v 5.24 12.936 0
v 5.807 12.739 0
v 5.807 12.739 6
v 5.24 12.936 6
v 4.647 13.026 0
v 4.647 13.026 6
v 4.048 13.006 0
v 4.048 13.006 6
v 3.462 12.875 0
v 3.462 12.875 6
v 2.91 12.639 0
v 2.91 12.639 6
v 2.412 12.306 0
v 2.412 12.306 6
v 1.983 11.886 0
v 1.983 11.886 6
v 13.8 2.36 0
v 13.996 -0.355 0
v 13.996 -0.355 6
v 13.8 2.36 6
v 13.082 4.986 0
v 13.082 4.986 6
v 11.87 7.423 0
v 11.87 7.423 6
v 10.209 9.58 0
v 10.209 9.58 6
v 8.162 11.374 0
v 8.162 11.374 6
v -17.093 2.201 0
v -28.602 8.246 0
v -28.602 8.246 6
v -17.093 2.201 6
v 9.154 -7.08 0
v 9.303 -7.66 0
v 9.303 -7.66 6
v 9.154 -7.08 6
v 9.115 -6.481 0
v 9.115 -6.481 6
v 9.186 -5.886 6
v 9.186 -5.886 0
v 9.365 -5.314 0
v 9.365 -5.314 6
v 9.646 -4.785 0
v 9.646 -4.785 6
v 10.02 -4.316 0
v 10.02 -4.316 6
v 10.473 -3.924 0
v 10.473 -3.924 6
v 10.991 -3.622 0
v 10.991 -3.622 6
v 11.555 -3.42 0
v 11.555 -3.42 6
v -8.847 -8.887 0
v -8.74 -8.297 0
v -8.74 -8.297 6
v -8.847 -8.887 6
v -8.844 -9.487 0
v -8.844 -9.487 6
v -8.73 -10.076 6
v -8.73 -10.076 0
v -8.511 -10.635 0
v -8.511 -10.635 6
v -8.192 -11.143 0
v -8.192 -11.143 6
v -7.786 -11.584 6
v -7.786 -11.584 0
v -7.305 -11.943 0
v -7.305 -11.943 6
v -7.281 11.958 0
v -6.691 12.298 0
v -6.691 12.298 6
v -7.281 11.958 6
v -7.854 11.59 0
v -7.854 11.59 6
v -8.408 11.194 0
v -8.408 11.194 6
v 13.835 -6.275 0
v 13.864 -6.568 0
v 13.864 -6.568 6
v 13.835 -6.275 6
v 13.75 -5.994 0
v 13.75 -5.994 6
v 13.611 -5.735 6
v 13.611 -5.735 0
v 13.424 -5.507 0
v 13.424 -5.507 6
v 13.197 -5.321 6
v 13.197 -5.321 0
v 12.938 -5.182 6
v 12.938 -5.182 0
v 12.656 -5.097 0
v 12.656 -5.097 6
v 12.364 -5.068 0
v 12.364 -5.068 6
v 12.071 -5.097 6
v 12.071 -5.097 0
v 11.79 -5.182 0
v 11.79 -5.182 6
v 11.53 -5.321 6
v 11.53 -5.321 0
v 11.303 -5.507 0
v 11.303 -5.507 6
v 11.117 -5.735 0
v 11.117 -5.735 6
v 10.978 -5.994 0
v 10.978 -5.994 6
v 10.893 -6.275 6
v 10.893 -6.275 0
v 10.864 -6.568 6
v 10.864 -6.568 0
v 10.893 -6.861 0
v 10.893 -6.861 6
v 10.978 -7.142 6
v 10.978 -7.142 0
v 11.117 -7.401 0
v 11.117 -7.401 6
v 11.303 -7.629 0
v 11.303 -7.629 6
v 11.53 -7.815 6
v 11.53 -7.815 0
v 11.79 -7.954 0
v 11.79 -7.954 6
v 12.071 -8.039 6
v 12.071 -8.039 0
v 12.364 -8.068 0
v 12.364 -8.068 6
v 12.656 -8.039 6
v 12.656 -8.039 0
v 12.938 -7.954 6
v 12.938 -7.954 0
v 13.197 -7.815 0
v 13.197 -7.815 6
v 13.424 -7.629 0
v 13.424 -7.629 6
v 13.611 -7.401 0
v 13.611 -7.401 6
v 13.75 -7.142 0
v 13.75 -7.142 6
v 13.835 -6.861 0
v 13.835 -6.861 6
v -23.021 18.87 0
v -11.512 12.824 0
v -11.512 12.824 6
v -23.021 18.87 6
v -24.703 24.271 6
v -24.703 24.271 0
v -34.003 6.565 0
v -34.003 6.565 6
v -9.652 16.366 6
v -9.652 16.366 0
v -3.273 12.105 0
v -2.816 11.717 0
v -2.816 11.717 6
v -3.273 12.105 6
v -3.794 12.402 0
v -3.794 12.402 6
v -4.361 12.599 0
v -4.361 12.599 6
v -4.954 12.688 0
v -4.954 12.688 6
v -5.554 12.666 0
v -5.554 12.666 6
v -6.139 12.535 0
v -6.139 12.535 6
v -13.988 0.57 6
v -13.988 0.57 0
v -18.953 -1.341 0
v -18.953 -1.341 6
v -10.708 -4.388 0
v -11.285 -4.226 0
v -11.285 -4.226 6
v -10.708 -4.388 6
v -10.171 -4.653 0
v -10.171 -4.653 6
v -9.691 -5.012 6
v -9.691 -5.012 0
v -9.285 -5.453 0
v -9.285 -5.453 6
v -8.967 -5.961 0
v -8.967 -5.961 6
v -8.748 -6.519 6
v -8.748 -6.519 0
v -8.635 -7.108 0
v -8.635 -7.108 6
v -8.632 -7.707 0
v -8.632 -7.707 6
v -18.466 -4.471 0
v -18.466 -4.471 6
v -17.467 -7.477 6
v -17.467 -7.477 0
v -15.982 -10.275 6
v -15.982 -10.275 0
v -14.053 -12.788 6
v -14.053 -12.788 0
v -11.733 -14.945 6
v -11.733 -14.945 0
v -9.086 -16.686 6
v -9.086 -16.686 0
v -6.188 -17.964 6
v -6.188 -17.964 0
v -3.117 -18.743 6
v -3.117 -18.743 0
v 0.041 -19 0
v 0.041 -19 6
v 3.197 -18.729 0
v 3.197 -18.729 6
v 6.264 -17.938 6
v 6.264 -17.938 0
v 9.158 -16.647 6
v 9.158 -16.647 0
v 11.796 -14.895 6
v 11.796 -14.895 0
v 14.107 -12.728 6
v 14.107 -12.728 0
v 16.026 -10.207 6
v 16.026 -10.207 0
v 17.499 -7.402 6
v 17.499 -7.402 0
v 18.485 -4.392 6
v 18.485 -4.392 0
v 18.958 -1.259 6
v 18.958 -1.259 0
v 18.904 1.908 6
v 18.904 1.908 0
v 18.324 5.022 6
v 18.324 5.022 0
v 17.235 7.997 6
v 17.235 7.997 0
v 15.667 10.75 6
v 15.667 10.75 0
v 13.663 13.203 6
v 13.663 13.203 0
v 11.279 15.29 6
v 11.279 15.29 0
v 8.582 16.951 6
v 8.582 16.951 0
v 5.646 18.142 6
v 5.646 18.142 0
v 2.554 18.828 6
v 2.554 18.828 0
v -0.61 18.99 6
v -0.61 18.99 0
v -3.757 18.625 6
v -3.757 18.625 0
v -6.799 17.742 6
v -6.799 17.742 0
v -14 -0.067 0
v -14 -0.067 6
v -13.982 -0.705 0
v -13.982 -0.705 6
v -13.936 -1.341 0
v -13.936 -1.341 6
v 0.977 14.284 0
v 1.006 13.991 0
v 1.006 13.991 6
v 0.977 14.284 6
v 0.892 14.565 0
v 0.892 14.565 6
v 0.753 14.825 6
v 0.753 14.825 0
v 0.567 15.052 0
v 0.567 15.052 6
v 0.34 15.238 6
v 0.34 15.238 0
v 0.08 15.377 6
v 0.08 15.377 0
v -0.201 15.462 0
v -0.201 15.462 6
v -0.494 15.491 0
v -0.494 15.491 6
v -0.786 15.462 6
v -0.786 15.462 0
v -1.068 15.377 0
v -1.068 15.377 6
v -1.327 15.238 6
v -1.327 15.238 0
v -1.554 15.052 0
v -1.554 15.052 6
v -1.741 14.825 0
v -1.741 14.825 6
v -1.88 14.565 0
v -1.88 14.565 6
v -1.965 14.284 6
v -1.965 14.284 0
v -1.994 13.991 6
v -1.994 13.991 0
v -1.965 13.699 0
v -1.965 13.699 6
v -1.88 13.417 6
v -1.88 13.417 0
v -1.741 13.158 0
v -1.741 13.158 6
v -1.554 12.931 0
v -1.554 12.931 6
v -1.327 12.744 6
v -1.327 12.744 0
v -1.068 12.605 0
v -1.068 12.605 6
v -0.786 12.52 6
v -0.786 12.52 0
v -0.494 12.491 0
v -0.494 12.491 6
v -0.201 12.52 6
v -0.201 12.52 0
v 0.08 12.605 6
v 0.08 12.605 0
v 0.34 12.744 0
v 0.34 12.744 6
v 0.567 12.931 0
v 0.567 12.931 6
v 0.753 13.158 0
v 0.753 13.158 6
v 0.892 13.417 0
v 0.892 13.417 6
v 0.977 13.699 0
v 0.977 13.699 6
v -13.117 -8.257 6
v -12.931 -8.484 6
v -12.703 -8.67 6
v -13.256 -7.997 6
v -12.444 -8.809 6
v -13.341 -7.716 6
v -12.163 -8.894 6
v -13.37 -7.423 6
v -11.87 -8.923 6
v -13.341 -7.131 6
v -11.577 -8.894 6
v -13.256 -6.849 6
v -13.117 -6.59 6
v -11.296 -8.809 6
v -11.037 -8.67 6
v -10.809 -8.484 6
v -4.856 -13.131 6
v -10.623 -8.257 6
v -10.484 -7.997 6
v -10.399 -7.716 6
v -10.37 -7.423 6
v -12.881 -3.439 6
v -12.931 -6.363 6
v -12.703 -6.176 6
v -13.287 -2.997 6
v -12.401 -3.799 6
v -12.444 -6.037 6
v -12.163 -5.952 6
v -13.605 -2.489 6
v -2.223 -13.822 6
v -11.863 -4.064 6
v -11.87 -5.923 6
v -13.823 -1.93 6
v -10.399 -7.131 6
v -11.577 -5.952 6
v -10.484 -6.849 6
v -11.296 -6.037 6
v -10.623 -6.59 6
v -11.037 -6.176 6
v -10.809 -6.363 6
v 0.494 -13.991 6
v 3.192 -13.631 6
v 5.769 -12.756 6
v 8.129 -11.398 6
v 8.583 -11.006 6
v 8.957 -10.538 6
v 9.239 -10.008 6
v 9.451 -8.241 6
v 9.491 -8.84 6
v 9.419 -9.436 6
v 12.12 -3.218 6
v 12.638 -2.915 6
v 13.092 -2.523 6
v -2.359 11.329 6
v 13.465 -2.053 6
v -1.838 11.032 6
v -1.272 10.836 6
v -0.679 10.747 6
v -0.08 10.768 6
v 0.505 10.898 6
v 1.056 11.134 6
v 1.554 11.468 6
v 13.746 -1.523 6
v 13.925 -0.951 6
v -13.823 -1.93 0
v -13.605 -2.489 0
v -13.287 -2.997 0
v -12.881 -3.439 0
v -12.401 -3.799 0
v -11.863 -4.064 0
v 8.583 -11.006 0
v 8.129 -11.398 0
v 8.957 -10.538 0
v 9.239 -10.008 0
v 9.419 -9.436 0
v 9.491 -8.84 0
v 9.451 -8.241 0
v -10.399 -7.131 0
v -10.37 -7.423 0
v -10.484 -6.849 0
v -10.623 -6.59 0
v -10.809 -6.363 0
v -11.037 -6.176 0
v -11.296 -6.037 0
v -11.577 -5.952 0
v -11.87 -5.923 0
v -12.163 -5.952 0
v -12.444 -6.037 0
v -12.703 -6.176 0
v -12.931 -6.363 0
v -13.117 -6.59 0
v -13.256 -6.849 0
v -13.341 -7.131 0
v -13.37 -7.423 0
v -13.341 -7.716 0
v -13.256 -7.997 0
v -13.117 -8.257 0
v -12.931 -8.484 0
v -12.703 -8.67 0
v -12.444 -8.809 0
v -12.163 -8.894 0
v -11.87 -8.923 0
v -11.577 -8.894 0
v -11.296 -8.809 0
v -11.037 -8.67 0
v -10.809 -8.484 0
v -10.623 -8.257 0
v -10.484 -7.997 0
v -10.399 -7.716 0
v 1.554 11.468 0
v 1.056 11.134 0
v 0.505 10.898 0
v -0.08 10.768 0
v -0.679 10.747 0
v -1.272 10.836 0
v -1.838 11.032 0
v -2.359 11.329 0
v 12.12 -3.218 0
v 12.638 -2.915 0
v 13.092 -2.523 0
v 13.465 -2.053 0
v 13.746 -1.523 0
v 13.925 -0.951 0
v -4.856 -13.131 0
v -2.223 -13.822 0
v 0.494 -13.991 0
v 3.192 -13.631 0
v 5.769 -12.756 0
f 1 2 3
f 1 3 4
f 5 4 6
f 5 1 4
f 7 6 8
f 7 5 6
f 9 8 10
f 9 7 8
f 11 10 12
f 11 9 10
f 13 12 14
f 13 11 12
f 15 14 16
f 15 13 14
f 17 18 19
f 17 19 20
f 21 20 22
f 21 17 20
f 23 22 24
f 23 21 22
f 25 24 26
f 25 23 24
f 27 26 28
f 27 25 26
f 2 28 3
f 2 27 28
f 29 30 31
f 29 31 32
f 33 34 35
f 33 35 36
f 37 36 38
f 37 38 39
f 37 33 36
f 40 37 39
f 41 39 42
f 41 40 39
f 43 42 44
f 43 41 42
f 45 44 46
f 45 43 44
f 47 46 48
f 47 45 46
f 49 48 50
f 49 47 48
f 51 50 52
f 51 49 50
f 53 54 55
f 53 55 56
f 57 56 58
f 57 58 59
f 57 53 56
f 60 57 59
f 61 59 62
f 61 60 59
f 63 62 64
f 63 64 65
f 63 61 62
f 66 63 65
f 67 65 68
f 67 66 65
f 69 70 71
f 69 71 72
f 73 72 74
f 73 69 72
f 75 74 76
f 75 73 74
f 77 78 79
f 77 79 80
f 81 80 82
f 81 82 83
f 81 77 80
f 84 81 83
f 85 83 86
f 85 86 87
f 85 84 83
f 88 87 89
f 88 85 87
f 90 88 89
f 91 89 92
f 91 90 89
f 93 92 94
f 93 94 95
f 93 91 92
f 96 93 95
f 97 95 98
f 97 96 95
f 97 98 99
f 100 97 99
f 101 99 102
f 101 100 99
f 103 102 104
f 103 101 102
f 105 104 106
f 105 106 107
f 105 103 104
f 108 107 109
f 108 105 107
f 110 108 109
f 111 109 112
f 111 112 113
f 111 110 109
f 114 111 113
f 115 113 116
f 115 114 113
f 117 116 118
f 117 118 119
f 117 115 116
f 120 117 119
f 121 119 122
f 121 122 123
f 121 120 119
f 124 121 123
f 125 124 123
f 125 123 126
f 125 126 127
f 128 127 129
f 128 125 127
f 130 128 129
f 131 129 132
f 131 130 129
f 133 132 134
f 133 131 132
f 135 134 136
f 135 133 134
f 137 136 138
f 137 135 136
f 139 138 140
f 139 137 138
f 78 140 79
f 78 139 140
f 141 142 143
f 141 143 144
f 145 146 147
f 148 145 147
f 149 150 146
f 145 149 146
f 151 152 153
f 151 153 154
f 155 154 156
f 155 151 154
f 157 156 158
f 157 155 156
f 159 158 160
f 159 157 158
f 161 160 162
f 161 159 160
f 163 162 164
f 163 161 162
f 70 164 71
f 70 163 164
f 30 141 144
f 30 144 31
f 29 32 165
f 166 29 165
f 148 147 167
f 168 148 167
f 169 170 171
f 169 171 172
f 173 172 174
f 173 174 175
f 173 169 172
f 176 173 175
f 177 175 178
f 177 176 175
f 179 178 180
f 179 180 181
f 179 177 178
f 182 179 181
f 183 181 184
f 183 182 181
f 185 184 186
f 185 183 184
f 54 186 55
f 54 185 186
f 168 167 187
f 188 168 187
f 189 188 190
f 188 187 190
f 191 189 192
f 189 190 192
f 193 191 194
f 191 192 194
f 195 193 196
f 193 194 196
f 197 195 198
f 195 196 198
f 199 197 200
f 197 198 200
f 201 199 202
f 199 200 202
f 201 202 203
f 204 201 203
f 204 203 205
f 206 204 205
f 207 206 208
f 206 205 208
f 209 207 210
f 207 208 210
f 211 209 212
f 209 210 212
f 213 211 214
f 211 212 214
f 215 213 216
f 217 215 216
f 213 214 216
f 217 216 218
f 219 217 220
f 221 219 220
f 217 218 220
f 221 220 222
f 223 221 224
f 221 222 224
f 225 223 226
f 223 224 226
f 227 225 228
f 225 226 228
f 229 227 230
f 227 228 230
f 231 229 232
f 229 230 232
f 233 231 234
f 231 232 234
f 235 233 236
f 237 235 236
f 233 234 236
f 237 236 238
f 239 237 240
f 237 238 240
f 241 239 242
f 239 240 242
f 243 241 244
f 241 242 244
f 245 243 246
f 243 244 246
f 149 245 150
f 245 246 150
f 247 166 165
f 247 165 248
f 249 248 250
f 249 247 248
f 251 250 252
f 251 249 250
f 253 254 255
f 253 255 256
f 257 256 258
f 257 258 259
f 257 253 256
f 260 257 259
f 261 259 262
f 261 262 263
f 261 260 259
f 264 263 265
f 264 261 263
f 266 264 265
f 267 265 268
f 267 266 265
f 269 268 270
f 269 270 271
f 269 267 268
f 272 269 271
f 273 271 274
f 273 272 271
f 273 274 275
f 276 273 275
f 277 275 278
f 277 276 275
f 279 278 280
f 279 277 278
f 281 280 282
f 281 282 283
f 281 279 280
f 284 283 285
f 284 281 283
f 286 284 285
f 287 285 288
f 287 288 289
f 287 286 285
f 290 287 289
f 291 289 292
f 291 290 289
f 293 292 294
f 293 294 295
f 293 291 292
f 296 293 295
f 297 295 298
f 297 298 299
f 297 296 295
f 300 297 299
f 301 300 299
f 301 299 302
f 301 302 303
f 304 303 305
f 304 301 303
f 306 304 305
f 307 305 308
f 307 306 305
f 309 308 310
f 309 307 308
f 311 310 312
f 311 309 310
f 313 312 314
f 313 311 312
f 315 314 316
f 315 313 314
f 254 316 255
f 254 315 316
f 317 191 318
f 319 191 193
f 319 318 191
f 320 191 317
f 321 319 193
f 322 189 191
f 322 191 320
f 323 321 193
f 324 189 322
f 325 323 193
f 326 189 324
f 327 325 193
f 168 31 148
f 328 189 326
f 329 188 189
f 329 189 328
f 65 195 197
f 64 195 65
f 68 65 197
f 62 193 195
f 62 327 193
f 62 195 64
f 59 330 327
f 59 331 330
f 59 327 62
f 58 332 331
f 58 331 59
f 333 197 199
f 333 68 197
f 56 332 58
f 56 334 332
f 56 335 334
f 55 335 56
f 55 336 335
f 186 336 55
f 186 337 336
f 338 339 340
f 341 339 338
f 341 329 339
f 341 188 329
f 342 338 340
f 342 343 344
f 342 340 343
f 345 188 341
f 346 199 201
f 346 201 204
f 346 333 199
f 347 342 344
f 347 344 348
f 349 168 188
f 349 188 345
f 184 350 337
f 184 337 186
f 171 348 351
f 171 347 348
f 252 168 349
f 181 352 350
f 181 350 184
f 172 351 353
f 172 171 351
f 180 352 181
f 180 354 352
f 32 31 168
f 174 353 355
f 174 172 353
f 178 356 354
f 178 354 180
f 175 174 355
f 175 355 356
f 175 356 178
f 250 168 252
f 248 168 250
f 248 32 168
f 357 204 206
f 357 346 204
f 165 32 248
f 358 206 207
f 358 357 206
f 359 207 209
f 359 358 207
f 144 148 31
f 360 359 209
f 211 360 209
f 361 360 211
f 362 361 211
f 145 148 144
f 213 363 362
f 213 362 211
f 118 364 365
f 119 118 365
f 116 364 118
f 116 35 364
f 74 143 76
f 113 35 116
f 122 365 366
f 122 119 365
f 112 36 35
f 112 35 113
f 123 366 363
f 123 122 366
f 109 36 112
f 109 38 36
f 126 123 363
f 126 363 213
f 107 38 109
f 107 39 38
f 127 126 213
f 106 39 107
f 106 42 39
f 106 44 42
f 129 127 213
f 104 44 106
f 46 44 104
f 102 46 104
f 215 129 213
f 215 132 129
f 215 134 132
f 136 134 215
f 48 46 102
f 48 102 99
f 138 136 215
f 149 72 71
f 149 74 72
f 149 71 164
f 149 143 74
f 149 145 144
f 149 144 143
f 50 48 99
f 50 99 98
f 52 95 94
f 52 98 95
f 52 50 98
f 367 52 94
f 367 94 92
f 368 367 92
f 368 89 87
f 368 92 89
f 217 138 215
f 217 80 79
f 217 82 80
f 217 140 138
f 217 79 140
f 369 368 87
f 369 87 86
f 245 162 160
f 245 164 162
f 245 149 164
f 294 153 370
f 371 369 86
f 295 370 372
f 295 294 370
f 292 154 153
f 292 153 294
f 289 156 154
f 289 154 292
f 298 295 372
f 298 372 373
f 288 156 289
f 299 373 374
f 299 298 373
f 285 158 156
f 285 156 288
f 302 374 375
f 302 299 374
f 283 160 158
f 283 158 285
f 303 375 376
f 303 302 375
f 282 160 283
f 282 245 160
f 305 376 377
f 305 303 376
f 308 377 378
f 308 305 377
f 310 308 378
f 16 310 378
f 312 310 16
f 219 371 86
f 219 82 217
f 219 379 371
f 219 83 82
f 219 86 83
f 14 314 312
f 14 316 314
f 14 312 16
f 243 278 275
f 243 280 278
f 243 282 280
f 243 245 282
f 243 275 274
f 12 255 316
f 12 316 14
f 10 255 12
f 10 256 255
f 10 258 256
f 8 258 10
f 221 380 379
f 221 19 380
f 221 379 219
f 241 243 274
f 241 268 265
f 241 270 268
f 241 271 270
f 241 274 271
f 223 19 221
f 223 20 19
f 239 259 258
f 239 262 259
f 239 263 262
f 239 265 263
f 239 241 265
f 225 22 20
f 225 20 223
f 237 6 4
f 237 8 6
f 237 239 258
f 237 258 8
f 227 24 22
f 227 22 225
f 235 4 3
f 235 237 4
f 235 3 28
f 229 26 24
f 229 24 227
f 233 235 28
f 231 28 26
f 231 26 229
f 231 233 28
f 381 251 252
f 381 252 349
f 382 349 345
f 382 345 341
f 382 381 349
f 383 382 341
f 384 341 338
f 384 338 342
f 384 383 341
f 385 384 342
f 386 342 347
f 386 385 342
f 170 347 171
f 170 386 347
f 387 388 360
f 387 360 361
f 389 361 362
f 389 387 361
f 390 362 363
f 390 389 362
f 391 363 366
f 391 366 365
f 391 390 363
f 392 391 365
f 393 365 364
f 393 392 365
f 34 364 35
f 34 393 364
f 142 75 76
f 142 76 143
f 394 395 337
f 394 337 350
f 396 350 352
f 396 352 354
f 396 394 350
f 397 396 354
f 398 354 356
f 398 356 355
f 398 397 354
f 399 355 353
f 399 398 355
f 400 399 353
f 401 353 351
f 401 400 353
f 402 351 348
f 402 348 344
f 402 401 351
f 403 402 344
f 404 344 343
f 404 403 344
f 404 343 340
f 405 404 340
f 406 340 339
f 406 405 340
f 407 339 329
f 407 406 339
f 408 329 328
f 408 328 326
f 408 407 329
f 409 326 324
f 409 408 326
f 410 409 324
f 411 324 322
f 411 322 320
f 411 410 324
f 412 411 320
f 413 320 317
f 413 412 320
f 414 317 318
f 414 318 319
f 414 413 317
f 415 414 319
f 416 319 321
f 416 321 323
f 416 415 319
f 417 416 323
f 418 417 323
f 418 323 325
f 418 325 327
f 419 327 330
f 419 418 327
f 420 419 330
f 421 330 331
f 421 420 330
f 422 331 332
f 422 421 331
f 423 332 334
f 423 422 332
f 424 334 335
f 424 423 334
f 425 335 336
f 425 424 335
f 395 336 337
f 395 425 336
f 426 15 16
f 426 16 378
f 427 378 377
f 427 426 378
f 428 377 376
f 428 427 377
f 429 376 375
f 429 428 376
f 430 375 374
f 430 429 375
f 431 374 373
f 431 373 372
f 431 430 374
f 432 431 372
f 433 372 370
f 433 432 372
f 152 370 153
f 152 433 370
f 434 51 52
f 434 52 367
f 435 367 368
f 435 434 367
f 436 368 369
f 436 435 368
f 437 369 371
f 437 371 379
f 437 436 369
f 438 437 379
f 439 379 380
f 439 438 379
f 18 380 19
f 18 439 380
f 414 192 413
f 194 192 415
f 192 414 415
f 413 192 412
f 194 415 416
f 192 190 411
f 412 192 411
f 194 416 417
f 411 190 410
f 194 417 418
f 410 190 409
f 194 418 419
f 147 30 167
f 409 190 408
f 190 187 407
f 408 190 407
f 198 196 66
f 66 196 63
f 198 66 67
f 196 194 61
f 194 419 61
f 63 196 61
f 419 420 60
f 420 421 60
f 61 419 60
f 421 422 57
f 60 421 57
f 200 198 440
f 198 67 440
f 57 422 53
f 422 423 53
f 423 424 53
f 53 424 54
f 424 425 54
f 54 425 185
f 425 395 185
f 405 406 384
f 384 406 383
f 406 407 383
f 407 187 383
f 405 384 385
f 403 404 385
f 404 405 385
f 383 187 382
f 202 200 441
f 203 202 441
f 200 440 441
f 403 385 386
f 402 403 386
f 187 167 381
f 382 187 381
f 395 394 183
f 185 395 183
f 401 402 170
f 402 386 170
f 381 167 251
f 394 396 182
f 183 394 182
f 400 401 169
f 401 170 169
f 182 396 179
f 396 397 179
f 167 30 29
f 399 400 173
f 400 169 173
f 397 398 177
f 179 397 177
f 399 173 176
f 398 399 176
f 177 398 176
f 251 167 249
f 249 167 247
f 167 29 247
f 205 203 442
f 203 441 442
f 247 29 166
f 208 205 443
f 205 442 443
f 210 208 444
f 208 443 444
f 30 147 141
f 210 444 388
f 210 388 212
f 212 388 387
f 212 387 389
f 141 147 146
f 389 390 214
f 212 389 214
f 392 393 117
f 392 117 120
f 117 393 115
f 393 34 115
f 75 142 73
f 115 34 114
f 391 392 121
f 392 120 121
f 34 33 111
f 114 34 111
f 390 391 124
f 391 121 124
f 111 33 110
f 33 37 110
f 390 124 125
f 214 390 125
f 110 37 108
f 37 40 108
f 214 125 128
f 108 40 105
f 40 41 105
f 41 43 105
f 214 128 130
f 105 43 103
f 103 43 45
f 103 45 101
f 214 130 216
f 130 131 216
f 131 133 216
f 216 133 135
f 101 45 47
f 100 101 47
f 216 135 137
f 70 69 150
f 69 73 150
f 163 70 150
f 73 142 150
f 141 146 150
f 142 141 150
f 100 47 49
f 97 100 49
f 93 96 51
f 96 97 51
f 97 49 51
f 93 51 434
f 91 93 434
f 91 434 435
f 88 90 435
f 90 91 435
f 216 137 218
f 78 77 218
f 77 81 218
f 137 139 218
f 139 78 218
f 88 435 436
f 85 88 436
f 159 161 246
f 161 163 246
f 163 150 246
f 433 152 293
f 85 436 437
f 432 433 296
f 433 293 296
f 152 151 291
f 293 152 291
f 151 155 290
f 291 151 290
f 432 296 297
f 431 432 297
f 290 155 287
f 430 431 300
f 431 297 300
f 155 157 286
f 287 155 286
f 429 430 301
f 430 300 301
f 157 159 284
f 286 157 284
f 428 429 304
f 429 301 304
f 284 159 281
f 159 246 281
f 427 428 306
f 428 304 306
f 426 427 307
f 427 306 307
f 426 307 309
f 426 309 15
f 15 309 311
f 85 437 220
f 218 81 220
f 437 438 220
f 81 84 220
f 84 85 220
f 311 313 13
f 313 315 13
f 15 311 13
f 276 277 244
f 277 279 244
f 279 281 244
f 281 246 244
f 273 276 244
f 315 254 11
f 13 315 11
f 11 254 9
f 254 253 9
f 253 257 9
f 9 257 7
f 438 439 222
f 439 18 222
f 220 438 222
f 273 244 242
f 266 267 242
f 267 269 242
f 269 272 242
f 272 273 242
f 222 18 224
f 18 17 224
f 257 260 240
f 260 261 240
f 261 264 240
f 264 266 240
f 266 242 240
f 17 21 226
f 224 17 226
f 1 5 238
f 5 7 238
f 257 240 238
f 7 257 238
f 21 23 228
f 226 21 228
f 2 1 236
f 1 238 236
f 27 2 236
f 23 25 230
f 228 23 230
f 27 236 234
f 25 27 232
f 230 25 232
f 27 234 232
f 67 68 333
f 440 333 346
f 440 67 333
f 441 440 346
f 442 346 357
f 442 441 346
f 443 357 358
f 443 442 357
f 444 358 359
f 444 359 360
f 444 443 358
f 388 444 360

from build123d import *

# Parameters (mm, degrees)
ESQUISSE1_R        = 1.5
BOSS_EXTRU_2_DEPTH = 6


with BuildPart() as part:
    # Esquisse1 → Boss.-Extru.2 (new body)
    with BuildSketch(Plane.XY):
        with BuildLine():
            Line((-9.65239237, 16.365552894), (-24.702558299, 24.270773037))
            Line((-24.702558299, 24.270773037), (-34.00281729, 6.564695473))
            Line((-34.00281729, 6.564695473), (-18.952651361, -1.34052467))
            ThreePointArc((-18.952651361, -1.34052467), (16.820773686, -8.835246042), (-9.65239237, 16.365552894))
        make_face()
        with Locations((-0.493805045, 13.991288596)):
            Circle(ESQUISSE1_R, mode=Mode.SUBTRACT)
        with Locations((12.363713879, -6.567996584)):
            Circle(ESQUISSE1_R, mode=Mode.SUBTRACT)
        with Locations((-11.869908833, -7.423292012)):
            Circle(ESQUISSE1_R, mode=Mode.SUBTRACT)
        with BuildLine():
            Line((-11.512444168, 12.824337382), (-23.021394585, 18.869505726))
            Line((-23.021394585, 18.869505726), (-28.601549979, 8.245859187))
            Line((-28.601549979, 8.245859187), (-17.092599563, 2.200690843))
            Line((-17.092599563, 2.200690843), (-13.988384403, 0.570176979))
            ThreePointArc((-13.988384403, 0.570176979), (-13.994675648, -0.386074479), (-13.935673418, -1.34052467))
            ThreePointArc((-13.935673418, -1.34052467), (-13.094244538, -3.227739126), (-11.285257604, -4.226311727))
            ThreePointArc((-11.285257604, -4.226311727), (-9.114394283, -5.700027795), (-8.739535981, -8.296942861))
            ThreePointArc((-8.739535981, -8.296942861), (-8.633495068, -10.360516531), (-7.304956633, -11.943098785))
            ThreePointArc((-7.304956633, -11.943098785), (0.493805045, -13.991288596), (8.128765127, -11.398384864))
            ThreePointArc((8.128765127, -11.398384864), (9.342426349, -9.72607885), (9.302722122, -7.66016391))
            ThreePointArc((9.302722122, -7.66016391), (9.493566014, -5.043283091), (11.555131282, -3.420188746))
            ThreePointArc((11.555131282, -3.420188746), (13.289218046, -2.296567787), (13.995505264, -0.354728625))
            ThreePointArc((13.995505264, -0.354728625), (11.869908833, 7.423292012), (5.806908291, 12.738909534))
            ThreePointArc((5.806908291, 12.738909534), (3.751818189, 12.953817976), (1.982535482, 11.886475637))
            ThreePointArc((1.982535482, 11.886475637), (-0.379171731, 10.743310886), (-2.815595301, 11.717131607))
            ThreePointArc((-2.815595301, 11.717131607), (-4.655722978, 12.657084318), (-6.690548632, 12.29782741))
            ThreePointArc((-6.690548632, 12.29782741), (-7.569542767, 11.777182273), (-8.408229009, 11.193823517))
            Line((-8.408229009, 11.193823517), (-11.512444168, 12.824337382))
        make_face(mode=Mode.SUBTRACT)
    extrude(amount=BOSS_EXTRU_2_DEPTH)


solid = part.part
